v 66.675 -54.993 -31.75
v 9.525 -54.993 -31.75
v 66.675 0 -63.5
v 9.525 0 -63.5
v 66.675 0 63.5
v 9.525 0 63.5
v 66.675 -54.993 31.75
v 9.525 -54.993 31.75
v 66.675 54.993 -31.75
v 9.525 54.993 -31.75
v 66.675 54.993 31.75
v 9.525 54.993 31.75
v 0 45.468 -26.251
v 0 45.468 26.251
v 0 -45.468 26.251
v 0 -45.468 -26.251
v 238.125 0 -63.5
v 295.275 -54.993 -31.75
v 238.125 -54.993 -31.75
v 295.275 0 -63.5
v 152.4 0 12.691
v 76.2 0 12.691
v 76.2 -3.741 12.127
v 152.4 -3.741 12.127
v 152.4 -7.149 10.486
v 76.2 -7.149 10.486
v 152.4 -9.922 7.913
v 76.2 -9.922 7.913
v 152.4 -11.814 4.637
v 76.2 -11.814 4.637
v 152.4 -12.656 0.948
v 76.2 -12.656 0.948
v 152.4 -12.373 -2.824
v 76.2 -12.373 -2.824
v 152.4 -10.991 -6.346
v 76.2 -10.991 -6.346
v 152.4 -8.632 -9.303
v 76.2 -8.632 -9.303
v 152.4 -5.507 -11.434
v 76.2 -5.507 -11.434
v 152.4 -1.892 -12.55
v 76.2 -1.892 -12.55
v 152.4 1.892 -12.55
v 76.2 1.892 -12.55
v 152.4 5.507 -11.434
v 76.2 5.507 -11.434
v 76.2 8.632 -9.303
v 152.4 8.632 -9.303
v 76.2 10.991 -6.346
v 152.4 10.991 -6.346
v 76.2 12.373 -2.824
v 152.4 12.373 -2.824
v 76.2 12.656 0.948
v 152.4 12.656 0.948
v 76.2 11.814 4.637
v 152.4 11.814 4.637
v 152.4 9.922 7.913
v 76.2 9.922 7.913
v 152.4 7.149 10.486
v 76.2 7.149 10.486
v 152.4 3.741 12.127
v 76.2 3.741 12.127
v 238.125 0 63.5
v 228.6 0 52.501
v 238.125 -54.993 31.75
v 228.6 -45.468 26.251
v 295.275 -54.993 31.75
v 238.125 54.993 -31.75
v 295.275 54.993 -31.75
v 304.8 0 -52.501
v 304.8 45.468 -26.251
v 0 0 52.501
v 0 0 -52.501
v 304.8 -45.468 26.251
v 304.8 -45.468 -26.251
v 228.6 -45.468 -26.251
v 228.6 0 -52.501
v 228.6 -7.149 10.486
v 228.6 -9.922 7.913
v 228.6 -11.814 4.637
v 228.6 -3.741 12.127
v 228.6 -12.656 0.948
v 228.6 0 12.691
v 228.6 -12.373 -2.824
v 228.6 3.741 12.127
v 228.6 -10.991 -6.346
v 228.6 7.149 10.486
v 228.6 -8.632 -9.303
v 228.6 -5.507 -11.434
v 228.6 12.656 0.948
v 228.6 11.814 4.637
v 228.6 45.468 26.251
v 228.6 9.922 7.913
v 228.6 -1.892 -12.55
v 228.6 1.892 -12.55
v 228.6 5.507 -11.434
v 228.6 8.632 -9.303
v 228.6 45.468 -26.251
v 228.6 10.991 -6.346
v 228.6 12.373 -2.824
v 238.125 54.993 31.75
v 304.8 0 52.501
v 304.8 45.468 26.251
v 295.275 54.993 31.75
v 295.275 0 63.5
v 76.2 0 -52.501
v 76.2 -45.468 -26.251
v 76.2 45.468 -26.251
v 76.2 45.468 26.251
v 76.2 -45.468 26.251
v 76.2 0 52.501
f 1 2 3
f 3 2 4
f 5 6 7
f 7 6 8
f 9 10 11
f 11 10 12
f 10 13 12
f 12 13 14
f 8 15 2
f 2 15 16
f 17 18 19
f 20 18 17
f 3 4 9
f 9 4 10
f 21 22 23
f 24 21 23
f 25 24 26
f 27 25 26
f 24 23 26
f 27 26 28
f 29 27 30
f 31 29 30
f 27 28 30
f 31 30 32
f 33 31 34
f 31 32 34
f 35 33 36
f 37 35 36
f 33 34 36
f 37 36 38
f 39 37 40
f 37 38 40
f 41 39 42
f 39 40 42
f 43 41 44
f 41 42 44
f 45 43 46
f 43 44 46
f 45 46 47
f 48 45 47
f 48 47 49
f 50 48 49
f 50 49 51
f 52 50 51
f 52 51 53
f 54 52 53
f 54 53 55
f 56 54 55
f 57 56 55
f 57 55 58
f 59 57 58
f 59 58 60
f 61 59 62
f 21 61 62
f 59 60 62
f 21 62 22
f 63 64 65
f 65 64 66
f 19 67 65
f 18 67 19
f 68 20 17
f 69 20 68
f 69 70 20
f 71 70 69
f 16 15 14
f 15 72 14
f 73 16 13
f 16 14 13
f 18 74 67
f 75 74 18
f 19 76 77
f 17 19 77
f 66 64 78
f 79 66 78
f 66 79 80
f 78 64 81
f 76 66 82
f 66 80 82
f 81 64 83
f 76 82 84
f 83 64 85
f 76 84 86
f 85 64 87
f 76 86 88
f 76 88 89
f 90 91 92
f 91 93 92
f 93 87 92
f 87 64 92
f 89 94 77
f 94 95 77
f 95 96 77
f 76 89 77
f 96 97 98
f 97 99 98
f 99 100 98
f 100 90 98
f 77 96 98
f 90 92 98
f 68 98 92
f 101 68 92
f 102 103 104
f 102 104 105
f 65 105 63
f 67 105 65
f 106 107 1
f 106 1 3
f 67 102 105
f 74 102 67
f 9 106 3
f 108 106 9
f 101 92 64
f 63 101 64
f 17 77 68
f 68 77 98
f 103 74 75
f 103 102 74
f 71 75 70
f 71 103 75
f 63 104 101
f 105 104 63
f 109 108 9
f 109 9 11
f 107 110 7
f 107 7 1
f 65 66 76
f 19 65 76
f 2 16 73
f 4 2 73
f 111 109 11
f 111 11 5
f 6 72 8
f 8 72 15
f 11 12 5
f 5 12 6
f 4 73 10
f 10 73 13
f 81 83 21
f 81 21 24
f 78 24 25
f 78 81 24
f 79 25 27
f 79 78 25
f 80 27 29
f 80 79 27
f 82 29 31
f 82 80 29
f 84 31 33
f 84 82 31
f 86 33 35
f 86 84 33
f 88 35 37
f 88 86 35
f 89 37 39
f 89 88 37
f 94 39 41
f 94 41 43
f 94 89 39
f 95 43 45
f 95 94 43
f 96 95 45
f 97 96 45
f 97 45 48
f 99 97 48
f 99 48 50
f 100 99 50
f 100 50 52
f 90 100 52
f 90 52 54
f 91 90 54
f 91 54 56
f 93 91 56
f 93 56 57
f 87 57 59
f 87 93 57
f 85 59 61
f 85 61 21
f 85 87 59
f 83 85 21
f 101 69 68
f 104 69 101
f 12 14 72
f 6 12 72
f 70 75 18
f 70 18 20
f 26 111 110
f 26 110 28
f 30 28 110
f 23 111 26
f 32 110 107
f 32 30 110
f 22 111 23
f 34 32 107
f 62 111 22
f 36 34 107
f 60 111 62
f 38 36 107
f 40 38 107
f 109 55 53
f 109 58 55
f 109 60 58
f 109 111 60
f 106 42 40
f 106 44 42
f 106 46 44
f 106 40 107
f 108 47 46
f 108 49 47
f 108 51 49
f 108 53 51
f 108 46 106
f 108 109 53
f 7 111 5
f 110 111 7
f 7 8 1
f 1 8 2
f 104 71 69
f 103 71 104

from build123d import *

# Parameters (mm, degrees)
BASE_EXTRUDE_DEPTH  = 76.2
CHAMFER1_SIZE       = 9.525
SKETCH2_R           = 12.691316964
BOSS_EXTRUDE1_DEPTH = 76.2


with BuildPart() as part:
    # Sketch1 → Base-Extrude (new body)
    with BuildSketch(Plane(origin=(0, 0, 0), x_dir=(0, 0, -1), z_dir=(1, 0, 0))):
        Polygon((63.5, 0), (31.75, 54.99261314), (-31.75, 54.99261314), (-63.5, 0), (-31.75, -54.99261314), (31.75, -54.99261314), align=None)
    extrude(amount=BASE_EXTRUDE_DEPTH)

    # Chamfer1
    chamfer1_edges = [part.edges().sort_by_distance(p)[0] for p in [
        (76.2, 54.99261314, 0),
        (76.2, 27.49630657, 47.625),
        (76.2, -27.49630657, 47.625),
        (76.2, -54.99261314, 0),
        (76.2, -27.49630657, -47.625),
        (0, -54.99261314, 0),
        (0, -27.49630657, 47.625),
        (0, 27.49630657, 47.625),
        (76.2, 27.49630657, -47.625),
        (0, 54.99261314, 0),
        (0, 27.49630657, -47.625),
        (0, -27.49630657, -47.625),
    ]]
    chamfer(chamfer1_edges, length=CHAMFER1_SIZE)

    # Sketch2 → Boss-Extrude1 (add)
    with BuildSketch(Plane(origin=(76.2, 0, 0), x_dir=(0, 0, -1), z_dir=(1, 0, 0))):
        with Locations(Location((0, 0, 0), (0, 0, 180))):
            Circle(SKETCH2_R)
    extrude(amount=BOSS_EXTRUDE1_DEPTH)

    # Mirror All1: part across plane


with BuildPart() as part_1:
    add(part.part)
    add(part.part.mirror(Plane(origin=(152.4, 0, 0), x_dir=(0, 0, 1), z_dir=(1, 0, 0))))


solid = part_1.part
